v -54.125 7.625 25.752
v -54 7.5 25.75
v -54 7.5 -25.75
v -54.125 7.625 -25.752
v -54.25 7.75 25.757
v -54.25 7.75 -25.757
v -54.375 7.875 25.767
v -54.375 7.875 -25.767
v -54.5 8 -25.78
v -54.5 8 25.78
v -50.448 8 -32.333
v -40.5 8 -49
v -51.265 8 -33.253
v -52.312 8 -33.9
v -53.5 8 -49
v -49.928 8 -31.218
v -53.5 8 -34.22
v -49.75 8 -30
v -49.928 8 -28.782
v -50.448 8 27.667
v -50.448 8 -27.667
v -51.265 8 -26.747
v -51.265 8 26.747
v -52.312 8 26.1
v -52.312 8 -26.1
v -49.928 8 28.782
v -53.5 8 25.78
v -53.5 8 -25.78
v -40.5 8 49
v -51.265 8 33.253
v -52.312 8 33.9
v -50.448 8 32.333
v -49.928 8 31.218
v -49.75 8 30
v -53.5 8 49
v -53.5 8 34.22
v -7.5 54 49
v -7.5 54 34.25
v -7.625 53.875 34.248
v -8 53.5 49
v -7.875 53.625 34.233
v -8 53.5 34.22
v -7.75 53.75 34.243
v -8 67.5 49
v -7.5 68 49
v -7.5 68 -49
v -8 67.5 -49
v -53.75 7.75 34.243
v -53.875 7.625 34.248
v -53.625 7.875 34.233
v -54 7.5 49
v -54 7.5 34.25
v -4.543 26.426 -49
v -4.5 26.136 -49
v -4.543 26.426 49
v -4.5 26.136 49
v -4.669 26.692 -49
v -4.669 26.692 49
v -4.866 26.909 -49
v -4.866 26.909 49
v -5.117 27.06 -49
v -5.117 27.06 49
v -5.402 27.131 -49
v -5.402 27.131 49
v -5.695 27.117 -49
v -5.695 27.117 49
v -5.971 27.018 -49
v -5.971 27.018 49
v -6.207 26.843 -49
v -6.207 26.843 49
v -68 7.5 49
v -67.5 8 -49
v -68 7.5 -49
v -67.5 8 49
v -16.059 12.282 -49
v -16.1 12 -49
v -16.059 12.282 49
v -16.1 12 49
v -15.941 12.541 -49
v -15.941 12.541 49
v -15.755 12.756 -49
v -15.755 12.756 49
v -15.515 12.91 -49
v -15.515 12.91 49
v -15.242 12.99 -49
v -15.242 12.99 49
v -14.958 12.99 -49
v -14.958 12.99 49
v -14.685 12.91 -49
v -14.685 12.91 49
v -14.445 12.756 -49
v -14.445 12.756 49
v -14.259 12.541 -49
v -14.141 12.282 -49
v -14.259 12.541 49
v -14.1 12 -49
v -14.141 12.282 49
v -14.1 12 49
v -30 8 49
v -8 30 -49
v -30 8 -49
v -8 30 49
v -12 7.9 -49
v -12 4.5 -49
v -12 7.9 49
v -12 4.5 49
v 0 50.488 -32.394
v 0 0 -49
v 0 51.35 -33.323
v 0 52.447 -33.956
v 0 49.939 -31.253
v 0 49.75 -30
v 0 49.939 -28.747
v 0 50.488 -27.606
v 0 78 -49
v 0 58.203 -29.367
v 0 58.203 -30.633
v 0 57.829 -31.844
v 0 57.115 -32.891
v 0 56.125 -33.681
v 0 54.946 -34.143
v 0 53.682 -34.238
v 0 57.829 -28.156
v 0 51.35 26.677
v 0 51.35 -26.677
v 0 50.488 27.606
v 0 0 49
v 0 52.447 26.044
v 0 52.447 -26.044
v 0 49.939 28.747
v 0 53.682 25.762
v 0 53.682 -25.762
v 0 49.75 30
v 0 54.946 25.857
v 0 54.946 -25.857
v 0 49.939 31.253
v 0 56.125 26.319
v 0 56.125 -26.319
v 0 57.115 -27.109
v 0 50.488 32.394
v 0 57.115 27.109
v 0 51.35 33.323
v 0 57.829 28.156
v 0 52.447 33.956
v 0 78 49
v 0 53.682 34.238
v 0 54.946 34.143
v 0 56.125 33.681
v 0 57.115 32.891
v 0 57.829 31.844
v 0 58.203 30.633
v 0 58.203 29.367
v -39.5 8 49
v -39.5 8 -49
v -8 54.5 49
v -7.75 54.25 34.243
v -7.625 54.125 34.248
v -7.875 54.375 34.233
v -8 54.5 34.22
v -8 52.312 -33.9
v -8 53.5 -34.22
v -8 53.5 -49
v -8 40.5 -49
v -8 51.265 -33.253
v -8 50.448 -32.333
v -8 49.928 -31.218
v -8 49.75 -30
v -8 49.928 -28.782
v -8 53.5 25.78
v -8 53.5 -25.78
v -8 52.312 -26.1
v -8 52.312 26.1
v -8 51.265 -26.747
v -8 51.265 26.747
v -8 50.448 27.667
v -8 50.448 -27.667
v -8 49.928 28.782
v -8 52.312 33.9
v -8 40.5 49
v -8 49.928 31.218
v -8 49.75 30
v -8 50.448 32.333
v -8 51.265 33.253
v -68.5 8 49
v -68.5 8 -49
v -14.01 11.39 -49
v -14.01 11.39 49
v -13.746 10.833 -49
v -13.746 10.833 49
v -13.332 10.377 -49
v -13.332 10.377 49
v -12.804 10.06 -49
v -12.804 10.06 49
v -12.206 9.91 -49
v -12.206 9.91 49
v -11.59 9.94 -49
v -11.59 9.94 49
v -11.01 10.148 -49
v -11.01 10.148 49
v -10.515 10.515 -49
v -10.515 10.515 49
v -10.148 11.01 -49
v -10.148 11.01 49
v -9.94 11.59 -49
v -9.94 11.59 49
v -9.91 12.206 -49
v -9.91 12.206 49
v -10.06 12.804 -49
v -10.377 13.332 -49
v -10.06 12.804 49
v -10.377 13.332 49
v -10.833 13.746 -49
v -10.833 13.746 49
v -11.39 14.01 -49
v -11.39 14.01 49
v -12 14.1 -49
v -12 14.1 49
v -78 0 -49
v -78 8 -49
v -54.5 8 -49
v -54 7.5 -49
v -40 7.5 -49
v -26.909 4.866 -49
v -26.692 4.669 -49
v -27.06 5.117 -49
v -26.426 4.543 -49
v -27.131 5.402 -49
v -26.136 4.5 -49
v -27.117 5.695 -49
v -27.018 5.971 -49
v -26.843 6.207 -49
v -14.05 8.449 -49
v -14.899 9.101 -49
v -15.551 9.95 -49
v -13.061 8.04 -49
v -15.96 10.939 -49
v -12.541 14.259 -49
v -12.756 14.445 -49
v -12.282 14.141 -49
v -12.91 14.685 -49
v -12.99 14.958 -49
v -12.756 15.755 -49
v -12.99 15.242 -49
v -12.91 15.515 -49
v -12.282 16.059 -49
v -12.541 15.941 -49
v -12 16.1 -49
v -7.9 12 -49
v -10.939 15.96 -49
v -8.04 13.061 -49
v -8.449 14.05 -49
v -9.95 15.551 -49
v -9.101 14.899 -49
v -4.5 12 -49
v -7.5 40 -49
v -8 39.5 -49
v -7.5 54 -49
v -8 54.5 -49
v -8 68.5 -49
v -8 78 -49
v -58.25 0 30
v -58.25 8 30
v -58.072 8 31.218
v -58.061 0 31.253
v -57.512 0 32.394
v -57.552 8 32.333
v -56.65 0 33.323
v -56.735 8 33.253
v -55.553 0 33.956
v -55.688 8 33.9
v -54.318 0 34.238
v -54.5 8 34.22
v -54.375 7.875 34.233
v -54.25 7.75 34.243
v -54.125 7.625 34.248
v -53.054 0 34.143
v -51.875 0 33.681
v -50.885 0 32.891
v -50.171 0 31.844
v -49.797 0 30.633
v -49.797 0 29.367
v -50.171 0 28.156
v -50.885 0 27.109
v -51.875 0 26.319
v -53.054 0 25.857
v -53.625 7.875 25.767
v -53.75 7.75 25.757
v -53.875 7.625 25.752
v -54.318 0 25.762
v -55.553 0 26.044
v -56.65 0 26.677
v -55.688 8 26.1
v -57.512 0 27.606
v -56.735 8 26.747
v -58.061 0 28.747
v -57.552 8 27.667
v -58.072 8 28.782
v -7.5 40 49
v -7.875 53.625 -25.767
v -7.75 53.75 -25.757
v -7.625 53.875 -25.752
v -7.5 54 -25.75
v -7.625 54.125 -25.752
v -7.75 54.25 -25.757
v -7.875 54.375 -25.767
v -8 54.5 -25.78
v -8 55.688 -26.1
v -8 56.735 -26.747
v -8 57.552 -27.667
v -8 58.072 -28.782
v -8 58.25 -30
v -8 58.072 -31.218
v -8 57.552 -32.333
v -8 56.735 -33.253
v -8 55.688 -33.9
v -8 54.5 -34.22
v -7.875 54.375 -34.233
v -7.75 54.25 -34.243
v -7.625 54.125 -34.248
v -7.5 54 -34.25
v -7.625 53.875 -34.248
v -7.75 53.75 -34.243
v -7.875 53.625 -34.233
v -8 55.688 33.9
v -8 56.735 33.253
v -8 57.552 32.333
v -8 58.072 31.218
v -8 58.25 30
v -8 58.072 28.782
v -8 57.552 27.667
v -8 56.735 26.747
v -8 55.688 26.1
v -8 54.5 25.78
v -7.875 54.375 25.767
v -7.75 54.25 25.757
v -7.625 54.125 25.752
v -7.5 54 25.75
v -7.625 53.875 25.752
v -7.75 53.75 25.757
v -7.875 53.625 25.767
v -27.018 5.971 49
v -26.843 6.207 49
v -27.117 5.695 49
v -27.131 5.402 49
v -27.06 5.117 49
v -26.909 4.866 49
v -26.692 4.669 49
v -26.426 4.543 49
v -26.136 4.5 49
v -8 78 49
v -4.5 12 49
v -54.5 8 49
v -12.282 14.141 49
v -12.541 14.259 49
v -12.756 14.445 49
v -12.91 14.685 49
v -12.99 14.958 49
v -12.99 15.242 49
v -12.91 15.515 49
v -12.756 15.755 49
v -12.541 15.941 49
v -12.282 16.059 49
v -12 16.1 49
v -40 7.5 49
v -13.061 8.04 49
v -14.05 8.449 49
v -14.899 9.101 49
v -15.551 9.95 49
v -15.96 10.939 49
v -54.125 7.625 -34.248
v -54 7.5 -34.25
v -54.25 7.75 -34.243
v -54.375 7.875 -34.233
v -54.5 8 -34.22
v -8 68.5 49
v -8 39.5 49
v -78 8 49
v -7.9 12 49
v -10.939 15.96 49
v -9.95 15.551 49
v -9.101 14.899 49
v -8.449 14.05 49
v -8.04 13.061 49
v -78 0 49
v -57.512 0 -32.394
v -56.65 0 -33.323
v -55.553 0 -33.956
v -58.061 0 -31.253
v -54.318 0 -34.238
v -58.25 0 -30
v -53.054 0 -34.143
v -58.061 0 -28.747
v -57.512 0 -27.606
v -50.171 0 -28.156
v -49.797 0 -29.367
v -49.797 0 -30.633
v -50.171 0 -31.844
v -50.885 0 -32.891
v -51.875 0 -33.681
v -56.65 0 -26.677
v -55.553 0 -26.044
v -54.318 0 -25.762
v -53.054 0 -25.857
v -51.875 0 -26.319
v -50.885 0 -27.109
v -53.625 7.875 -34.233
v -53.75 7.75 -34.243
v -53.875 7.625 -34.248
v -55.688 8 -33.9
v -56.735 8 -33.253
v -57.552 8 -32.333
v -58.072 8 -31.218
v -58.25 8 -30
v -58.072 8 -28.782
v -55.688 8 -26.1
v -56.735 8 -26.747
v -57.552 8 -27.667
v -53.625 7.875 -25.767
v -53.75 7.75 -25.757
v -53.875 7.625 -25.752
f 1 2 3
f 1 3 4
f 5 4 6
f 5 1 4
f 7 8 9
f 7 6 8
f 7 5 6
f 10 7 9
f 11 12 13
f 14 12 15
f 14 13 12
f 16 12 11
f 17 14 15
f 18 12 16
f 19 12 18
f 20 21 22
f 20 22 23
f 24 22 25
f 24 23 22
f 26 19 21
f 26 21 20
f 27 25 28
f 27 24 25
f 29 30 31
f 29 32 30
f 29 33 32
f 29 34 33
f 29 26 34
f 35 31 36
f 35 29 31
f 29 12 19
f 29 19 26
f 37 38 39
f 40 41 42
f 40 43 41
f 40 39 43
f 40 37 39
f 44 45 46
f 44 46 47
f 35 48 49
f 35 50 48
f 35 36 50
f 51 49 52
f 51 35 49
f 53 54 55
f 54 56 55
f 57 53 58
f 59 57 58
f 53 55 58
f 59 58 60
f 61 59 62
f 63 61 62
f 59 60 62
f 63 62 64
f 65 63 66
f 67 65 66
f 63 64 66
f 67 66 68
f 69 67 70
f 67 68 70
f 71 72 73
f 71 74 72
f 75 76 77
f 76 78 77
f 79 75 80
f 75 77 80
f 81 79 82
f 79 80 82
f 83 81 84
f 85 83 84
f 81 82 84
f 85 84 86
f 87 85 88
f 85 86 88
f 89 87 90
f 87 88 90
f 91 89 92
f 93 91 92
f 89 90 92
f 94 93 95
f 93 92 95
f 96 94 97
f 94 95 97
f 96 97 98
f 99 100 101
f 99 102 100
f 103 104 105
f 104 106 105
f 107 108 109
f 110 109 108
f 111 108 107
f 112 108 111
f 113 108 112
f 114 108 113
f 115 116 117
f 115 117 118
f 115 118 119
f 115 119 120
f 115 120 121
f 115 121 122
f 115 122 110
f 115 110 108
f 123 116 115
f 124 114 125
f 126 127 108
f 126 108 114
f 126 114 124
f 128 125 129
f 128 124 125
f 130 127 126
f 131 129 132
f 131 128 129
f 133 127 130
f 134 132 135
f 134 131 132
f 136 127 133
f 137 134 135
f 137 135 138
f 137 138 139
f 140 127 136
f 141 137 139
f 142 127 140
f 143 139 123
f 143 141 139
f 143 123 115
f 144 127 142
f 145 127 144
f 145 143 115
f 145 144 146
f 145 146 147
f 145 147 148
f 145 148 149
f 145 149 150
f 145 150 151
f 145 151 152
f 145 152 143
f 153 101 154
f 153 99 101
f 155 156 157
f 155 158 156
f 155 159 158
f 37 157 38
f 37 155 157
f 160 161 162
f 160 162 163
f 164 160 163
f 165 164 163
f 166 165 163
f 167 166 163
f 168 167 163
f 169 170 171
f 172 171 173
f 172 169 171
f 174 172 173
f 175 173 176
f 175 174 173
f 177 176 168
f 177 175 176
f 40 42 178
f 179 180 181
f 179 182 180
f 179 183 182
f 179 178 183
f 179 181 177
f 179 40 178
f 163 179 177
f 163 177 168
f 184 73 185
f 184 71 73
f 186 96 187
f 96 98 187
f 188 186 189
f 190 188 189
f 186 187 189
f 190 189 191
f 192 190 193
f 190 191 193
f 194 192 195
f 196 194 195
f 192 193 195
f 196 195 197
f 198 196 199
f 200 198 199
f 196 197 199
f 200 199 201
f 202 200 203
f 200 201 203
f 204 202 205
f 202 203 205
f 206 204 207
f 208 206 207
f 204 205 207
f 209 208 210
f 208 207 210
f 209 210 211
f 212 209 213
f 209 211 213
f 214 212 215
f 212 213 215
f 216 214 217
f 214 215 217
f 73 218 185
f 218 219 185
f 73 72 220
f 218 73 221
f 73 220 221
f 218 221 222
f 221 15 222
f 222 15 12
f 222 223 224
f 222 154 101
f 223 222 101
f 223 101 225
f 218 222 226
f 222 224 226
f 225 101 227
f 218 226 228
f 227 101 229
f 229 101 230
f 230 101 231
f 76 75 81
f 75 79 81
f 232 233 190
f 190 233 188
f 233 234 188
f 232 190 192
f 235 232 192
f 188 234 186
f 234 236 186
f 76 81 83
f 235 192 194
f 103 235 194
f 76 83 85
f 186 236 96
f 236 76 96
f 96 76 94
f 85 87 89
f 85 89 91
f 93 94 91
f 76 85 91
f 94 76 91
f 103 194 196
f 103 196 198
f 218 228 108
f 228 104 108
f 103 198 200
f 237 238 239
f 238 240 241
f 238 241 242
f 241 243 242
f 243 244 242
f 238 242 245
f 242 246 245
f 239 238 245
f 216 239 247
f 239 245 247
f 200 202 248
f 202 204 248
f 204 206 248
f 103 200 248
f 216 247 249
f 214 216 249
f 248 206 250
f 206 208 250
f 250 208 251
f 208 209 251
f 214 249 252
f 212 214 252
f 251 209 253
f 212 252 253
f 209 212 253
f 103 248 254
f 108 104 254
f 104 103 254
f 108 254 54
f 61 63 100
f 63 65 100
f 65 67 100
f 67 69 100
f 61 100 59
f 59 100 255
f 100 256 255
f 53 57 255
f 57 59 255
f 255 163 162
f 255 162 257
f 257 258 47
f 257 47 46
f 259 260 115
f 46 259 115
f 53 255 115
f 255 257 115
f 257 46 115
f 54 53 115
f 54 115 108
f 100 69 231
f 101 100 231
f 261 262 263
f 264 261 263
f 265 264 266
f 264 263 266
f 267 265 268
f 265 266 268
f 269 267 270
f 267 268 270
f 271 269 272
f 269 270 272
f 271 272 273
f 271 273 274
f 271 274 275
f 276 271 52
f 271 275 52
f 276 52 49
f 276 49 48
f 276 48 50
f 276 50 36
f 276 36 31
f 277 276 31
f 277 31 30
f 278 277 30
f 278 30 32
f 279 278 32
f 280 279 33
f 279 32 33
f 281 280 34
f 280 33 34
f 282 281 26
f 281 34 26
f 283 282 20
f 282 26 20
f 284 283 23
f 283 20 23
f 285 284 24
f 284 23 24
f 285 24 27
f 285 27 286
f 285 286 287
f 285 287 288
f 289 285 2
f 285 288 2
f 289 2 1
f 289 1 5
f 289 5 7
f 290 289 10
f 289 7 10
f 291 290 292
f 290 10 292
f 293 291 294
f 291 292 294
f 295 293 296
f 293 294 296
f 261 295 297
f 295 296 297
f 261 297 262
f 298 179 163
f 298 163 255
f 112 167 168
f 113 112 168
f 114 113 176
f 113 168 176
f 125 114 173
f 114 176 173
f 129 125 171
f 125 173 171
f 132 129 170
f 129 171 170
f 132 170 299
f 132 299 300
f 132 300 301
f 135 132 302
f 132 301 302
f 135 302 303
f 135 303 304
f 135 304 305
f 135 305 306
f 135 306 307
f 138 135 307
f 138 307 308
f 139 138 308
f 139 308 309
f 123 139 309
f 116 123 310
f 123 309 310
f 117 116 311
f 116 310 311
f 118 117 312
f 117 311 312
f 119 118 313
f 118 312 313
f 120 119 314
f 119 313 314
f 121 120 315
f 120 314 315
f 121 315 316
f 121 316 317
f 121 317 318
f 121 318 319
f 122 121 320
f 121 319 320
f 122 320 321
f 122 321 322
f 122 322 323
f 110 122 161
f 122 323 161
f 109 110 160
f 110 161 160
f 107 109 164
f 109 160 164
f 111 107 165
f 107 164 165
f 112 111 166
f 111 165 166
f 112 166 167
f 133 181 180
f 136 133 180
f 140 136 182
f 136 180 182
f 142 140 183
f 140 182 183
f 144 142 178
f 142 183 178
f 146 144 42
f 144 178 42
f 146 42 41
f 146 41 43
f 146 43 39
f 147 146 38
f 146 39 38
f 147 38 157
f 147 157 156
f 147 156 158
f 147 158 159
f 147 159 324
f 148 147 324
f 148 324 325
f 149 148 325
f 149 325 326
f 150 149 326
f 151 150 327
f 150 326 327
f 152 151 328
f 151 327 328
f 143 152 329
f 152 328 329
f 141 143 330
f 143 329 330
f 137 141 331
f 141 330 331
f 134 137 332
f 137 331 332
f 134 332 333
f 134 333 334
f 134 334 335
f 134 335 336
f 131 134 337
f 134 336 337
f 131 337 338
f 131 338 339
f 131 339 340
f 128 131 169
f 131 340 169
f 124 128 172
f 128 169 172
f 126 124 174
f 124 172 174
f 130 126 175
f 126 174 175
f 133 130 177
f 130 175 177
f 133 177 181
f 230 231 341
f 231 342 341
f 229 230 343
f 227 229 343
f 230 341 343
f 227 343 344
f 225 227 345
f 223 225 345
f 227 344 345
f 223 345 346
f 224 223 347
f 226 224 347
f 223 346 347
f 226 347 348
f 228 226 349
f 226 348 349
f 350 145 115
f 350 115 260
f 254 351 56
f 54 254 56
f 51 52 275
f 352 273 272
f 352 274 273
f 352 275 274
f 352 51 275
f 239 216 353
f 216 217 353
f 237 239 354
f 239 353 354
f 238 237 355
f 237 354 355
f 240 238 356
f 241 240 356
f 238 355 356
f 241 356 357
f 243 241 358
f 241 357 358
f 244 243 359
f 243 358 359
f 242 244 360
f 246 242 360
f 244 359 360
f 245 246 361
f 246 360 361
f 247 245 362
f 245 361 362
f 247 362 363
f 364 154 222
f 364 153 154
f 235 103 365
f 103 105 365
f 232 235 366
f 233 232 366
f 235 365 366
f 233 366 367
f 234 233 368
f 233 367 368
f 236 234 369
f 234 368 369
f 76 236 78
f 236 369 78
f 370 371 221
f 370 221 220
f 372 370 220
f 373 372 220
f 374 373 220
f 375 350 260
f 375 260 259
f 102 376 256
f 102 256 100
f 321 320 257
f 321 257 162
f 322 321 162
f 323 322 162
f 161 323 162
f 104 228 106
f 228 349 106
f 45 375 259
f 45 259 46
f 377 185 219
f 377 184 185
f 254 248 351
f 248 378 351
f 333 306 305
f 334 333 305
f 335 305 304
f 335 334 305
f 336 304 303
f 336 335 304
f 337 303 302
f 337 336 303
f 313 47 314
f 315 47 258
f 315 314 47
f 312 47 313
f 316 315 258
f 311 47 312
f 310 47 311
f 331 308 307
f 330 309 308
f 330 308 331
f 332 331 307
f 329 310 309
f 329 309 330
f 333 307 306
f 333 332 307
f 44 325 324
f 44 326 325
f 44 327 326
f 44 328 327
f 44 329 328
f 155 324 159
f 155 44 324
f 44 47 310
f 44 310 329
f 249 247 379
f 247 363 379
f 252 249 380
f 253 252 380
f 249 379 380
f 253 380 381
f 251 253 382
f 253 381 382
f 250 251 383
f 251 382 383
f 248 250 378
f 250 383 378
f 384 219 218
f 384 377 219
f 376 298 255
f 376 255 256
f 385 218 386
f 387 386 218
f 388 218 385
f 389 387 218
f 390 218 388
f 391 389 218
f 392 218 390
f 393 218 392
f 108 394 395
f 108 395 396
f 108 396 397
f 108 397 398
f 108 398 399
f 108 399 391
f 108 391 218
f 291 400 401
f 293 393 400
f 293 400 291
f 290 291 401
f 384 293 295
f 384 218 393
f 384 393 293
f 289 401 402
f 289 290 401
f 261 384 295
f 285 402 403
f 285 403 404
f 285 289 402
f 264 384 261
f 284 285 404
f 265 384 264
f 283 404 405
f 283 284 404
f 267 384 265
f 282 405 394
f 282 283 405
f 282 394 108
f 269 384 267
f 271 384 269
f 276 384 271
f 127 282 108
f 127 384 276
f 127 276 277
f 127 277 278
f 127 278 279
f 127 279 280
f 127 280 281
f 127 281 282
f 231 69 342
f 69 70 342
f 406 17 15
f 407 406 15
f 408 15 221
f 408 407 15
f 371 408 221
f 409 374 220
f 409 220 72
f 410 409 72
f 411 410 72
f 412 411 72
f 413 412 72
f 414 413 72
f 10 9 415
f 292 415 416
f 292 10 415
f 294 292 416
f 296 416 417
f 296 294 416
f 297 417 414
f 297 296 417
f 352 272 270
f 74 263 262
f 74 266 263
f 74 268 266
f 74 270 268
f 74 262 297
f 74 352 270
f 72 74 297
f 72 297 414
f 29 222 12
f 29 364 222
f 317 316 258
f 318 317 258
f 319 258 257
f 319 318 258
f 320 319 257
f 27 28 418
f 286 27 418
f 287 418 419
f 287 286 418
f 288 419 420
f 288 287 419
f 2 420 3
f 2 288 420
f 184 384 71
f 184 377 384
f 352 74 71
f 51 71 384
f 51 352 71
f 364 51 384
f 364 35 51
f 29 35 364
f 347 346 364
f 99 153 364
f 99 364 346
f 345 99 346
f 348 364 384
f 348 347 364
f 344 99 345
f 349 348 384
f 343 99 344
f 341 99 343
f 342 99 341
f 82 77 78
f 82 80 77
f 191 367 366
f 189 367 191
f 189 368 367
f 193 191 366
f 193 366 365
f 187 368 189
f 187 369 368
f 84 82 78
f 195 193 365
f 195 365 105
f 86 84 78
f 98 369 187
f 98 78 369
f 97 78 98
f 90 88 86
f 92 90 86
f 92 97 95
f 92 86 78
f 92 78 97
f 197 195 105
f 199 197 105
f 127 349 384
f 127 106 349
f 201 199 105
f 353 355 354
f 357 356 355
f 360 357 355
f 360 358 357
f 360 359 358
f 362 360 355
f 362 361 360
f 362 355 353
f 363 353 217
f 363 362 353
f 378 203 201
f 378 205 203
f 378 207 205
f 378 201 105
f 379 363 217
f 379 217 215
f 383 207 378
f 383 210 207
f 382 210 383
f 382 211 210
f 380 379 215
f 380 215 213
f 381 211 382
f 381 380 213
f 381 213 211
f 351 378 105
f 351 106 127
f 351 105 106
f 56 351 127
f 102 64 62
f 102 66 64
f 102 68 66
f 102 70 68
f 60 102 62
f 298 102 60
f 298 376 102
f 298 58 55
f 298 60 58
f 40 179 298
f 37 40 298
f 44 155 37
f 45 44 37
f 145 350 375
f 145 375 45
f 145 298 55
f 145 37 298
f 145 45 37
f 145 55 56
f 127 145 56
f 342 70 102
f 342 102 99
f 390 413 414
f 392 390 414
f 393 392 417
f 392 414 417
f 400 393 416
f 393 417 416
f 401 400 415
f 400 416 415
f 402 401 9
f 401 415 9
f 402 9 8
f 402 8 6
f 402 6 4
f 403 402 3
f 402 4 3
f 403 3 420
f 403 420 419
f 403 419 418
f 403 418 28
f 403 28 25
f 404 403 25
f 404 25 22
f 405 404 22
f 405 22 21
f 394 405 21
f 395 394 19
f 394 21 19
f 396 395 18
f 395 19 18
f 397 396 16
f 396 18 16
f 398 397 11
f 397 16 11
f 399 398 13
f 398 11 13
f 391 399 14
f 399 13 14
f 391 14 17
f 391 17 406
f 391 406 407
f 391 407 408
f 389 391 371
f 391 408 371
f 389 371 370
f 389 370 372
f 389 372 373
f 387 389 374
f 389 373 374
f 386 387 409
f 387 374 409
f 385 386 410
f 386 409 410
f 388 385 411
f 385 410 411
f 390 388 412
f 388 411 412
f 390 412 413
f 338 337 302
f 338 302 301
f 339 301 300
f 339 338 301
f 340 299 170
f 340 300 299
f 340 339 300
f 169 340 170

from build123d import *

# Parameters (mm, degrees)
EXTRUDE_1_DEPTH     = 49
SKETCH_2_R          = 4.25
CUT_EXTRUDE_1_DEPTH = 9
SKETCH_3_R          = 4.25
CUT_EXTRUDE_2_DEPTH = 9


with BuildPart() as part:
    # Эскиз1 → Бобышка-Вытянуть1 (new body, symmetric)
    with BuildSketch(Plane.XY):
        Polygon((-78, 0), (0, 0), (0, 78), (-8, 78), (-8, 68.5), (-7.5, 68), (-8, 67.5), (-8, 54.5), (-7.5, 54), (-8, 53.5), (-8, 40.5), (-7.5, 40), (-8, 39.5), (-8, 30), (-30, 8), (-39.5, 8), (-40, 7.5), (-40.5, 8), (-53.5, 8), (-54, 7.5), (-54.5, 8), (-67.5, 8), (-68, 7.5), (-68.5, 8), (-78, 8), align=None)
        with BuildLine():
            Line((-4.5, 12), (-4.5, 26.136038969))
            ThreePointArc((-4.5, 26.136038969), (-5.117316568, 27.059918502), (-6.207106781, 26.843145751))
            Line((-6.207106781, 26.843145751), (-26.843145751, 6.207106781))
            ThreePointArc((-26.843145751, 6.207106781), (-27.059918502, 5.117316568), (-26.136038969, 4.5))
            Line((-26.136038969, 4.5), (-12, 4.5))
            Line((-12, 4.5), (-12, 7.9))
            ThreePointArc((-12, 7.9), (-14.899137803, 9.100862197), (-16.1, 12))
            ThreePointArc((-16.1, 12), (-15.1, 13), (-14.1, 12))
            ThreePointArc((-14.1, 12), (-10.51507576, 10.51507576), (-12, 14.1))
            ThreePointArc((-12, 14.1), (-13, 15.1), (-12, 16.1))
            ThreePointArc((-12, 16.1), (-9.100862197, 14.899137803), (-7.9, 12))
            Line((-7.9, 12), (-4.5, 12))
        make_face(mode=Mode.SUBTRACT)
    extrude(amount=EXTRUDE_1_DEPTH, both=True)

    # Эскиз2 → Вырез-Вытянуть1 (cut, through all)
    with BuildSketch(Plane.ZY.offset(8)):
        with Locations(Location((-30, 54, 0), (0, 0, 270))):  # turned: the seam where the file's is
            Circle(SKETCH_2_R)
        with Locations(Location((30, 54, 0), (0, 0, 270))):  # turned: the seam where the file's is
            Circle(SKETCH_2_R)
    extrude(amount=-CUT_EXTRUDE_1_DEPTH, mode=Mode.SUBTRACT)

    # Эскиз3 → Вырез-Вытянуть2 (cut, through all)
    with BuildSketch(Plane(origin=(0, 8, 0), x_dir=(1, 0, 0), z_dir=(0, 1, 0))):
        with Locations(Location((-54, -30, 0), (0, 0, 180))):  # turned: the seam where the file's is
            Circle(SKETCH_3_R)
        with Locations(Location((-54, 30, 0), (0, 0, 180))):  # turned: the seam where the file's is
            Circle(SKETCH_3_R)
    extrude(amount=-CUT_EXTRUDE_2_DEPTH, mode=Mode.SUBTRACT)


solid = part.part
